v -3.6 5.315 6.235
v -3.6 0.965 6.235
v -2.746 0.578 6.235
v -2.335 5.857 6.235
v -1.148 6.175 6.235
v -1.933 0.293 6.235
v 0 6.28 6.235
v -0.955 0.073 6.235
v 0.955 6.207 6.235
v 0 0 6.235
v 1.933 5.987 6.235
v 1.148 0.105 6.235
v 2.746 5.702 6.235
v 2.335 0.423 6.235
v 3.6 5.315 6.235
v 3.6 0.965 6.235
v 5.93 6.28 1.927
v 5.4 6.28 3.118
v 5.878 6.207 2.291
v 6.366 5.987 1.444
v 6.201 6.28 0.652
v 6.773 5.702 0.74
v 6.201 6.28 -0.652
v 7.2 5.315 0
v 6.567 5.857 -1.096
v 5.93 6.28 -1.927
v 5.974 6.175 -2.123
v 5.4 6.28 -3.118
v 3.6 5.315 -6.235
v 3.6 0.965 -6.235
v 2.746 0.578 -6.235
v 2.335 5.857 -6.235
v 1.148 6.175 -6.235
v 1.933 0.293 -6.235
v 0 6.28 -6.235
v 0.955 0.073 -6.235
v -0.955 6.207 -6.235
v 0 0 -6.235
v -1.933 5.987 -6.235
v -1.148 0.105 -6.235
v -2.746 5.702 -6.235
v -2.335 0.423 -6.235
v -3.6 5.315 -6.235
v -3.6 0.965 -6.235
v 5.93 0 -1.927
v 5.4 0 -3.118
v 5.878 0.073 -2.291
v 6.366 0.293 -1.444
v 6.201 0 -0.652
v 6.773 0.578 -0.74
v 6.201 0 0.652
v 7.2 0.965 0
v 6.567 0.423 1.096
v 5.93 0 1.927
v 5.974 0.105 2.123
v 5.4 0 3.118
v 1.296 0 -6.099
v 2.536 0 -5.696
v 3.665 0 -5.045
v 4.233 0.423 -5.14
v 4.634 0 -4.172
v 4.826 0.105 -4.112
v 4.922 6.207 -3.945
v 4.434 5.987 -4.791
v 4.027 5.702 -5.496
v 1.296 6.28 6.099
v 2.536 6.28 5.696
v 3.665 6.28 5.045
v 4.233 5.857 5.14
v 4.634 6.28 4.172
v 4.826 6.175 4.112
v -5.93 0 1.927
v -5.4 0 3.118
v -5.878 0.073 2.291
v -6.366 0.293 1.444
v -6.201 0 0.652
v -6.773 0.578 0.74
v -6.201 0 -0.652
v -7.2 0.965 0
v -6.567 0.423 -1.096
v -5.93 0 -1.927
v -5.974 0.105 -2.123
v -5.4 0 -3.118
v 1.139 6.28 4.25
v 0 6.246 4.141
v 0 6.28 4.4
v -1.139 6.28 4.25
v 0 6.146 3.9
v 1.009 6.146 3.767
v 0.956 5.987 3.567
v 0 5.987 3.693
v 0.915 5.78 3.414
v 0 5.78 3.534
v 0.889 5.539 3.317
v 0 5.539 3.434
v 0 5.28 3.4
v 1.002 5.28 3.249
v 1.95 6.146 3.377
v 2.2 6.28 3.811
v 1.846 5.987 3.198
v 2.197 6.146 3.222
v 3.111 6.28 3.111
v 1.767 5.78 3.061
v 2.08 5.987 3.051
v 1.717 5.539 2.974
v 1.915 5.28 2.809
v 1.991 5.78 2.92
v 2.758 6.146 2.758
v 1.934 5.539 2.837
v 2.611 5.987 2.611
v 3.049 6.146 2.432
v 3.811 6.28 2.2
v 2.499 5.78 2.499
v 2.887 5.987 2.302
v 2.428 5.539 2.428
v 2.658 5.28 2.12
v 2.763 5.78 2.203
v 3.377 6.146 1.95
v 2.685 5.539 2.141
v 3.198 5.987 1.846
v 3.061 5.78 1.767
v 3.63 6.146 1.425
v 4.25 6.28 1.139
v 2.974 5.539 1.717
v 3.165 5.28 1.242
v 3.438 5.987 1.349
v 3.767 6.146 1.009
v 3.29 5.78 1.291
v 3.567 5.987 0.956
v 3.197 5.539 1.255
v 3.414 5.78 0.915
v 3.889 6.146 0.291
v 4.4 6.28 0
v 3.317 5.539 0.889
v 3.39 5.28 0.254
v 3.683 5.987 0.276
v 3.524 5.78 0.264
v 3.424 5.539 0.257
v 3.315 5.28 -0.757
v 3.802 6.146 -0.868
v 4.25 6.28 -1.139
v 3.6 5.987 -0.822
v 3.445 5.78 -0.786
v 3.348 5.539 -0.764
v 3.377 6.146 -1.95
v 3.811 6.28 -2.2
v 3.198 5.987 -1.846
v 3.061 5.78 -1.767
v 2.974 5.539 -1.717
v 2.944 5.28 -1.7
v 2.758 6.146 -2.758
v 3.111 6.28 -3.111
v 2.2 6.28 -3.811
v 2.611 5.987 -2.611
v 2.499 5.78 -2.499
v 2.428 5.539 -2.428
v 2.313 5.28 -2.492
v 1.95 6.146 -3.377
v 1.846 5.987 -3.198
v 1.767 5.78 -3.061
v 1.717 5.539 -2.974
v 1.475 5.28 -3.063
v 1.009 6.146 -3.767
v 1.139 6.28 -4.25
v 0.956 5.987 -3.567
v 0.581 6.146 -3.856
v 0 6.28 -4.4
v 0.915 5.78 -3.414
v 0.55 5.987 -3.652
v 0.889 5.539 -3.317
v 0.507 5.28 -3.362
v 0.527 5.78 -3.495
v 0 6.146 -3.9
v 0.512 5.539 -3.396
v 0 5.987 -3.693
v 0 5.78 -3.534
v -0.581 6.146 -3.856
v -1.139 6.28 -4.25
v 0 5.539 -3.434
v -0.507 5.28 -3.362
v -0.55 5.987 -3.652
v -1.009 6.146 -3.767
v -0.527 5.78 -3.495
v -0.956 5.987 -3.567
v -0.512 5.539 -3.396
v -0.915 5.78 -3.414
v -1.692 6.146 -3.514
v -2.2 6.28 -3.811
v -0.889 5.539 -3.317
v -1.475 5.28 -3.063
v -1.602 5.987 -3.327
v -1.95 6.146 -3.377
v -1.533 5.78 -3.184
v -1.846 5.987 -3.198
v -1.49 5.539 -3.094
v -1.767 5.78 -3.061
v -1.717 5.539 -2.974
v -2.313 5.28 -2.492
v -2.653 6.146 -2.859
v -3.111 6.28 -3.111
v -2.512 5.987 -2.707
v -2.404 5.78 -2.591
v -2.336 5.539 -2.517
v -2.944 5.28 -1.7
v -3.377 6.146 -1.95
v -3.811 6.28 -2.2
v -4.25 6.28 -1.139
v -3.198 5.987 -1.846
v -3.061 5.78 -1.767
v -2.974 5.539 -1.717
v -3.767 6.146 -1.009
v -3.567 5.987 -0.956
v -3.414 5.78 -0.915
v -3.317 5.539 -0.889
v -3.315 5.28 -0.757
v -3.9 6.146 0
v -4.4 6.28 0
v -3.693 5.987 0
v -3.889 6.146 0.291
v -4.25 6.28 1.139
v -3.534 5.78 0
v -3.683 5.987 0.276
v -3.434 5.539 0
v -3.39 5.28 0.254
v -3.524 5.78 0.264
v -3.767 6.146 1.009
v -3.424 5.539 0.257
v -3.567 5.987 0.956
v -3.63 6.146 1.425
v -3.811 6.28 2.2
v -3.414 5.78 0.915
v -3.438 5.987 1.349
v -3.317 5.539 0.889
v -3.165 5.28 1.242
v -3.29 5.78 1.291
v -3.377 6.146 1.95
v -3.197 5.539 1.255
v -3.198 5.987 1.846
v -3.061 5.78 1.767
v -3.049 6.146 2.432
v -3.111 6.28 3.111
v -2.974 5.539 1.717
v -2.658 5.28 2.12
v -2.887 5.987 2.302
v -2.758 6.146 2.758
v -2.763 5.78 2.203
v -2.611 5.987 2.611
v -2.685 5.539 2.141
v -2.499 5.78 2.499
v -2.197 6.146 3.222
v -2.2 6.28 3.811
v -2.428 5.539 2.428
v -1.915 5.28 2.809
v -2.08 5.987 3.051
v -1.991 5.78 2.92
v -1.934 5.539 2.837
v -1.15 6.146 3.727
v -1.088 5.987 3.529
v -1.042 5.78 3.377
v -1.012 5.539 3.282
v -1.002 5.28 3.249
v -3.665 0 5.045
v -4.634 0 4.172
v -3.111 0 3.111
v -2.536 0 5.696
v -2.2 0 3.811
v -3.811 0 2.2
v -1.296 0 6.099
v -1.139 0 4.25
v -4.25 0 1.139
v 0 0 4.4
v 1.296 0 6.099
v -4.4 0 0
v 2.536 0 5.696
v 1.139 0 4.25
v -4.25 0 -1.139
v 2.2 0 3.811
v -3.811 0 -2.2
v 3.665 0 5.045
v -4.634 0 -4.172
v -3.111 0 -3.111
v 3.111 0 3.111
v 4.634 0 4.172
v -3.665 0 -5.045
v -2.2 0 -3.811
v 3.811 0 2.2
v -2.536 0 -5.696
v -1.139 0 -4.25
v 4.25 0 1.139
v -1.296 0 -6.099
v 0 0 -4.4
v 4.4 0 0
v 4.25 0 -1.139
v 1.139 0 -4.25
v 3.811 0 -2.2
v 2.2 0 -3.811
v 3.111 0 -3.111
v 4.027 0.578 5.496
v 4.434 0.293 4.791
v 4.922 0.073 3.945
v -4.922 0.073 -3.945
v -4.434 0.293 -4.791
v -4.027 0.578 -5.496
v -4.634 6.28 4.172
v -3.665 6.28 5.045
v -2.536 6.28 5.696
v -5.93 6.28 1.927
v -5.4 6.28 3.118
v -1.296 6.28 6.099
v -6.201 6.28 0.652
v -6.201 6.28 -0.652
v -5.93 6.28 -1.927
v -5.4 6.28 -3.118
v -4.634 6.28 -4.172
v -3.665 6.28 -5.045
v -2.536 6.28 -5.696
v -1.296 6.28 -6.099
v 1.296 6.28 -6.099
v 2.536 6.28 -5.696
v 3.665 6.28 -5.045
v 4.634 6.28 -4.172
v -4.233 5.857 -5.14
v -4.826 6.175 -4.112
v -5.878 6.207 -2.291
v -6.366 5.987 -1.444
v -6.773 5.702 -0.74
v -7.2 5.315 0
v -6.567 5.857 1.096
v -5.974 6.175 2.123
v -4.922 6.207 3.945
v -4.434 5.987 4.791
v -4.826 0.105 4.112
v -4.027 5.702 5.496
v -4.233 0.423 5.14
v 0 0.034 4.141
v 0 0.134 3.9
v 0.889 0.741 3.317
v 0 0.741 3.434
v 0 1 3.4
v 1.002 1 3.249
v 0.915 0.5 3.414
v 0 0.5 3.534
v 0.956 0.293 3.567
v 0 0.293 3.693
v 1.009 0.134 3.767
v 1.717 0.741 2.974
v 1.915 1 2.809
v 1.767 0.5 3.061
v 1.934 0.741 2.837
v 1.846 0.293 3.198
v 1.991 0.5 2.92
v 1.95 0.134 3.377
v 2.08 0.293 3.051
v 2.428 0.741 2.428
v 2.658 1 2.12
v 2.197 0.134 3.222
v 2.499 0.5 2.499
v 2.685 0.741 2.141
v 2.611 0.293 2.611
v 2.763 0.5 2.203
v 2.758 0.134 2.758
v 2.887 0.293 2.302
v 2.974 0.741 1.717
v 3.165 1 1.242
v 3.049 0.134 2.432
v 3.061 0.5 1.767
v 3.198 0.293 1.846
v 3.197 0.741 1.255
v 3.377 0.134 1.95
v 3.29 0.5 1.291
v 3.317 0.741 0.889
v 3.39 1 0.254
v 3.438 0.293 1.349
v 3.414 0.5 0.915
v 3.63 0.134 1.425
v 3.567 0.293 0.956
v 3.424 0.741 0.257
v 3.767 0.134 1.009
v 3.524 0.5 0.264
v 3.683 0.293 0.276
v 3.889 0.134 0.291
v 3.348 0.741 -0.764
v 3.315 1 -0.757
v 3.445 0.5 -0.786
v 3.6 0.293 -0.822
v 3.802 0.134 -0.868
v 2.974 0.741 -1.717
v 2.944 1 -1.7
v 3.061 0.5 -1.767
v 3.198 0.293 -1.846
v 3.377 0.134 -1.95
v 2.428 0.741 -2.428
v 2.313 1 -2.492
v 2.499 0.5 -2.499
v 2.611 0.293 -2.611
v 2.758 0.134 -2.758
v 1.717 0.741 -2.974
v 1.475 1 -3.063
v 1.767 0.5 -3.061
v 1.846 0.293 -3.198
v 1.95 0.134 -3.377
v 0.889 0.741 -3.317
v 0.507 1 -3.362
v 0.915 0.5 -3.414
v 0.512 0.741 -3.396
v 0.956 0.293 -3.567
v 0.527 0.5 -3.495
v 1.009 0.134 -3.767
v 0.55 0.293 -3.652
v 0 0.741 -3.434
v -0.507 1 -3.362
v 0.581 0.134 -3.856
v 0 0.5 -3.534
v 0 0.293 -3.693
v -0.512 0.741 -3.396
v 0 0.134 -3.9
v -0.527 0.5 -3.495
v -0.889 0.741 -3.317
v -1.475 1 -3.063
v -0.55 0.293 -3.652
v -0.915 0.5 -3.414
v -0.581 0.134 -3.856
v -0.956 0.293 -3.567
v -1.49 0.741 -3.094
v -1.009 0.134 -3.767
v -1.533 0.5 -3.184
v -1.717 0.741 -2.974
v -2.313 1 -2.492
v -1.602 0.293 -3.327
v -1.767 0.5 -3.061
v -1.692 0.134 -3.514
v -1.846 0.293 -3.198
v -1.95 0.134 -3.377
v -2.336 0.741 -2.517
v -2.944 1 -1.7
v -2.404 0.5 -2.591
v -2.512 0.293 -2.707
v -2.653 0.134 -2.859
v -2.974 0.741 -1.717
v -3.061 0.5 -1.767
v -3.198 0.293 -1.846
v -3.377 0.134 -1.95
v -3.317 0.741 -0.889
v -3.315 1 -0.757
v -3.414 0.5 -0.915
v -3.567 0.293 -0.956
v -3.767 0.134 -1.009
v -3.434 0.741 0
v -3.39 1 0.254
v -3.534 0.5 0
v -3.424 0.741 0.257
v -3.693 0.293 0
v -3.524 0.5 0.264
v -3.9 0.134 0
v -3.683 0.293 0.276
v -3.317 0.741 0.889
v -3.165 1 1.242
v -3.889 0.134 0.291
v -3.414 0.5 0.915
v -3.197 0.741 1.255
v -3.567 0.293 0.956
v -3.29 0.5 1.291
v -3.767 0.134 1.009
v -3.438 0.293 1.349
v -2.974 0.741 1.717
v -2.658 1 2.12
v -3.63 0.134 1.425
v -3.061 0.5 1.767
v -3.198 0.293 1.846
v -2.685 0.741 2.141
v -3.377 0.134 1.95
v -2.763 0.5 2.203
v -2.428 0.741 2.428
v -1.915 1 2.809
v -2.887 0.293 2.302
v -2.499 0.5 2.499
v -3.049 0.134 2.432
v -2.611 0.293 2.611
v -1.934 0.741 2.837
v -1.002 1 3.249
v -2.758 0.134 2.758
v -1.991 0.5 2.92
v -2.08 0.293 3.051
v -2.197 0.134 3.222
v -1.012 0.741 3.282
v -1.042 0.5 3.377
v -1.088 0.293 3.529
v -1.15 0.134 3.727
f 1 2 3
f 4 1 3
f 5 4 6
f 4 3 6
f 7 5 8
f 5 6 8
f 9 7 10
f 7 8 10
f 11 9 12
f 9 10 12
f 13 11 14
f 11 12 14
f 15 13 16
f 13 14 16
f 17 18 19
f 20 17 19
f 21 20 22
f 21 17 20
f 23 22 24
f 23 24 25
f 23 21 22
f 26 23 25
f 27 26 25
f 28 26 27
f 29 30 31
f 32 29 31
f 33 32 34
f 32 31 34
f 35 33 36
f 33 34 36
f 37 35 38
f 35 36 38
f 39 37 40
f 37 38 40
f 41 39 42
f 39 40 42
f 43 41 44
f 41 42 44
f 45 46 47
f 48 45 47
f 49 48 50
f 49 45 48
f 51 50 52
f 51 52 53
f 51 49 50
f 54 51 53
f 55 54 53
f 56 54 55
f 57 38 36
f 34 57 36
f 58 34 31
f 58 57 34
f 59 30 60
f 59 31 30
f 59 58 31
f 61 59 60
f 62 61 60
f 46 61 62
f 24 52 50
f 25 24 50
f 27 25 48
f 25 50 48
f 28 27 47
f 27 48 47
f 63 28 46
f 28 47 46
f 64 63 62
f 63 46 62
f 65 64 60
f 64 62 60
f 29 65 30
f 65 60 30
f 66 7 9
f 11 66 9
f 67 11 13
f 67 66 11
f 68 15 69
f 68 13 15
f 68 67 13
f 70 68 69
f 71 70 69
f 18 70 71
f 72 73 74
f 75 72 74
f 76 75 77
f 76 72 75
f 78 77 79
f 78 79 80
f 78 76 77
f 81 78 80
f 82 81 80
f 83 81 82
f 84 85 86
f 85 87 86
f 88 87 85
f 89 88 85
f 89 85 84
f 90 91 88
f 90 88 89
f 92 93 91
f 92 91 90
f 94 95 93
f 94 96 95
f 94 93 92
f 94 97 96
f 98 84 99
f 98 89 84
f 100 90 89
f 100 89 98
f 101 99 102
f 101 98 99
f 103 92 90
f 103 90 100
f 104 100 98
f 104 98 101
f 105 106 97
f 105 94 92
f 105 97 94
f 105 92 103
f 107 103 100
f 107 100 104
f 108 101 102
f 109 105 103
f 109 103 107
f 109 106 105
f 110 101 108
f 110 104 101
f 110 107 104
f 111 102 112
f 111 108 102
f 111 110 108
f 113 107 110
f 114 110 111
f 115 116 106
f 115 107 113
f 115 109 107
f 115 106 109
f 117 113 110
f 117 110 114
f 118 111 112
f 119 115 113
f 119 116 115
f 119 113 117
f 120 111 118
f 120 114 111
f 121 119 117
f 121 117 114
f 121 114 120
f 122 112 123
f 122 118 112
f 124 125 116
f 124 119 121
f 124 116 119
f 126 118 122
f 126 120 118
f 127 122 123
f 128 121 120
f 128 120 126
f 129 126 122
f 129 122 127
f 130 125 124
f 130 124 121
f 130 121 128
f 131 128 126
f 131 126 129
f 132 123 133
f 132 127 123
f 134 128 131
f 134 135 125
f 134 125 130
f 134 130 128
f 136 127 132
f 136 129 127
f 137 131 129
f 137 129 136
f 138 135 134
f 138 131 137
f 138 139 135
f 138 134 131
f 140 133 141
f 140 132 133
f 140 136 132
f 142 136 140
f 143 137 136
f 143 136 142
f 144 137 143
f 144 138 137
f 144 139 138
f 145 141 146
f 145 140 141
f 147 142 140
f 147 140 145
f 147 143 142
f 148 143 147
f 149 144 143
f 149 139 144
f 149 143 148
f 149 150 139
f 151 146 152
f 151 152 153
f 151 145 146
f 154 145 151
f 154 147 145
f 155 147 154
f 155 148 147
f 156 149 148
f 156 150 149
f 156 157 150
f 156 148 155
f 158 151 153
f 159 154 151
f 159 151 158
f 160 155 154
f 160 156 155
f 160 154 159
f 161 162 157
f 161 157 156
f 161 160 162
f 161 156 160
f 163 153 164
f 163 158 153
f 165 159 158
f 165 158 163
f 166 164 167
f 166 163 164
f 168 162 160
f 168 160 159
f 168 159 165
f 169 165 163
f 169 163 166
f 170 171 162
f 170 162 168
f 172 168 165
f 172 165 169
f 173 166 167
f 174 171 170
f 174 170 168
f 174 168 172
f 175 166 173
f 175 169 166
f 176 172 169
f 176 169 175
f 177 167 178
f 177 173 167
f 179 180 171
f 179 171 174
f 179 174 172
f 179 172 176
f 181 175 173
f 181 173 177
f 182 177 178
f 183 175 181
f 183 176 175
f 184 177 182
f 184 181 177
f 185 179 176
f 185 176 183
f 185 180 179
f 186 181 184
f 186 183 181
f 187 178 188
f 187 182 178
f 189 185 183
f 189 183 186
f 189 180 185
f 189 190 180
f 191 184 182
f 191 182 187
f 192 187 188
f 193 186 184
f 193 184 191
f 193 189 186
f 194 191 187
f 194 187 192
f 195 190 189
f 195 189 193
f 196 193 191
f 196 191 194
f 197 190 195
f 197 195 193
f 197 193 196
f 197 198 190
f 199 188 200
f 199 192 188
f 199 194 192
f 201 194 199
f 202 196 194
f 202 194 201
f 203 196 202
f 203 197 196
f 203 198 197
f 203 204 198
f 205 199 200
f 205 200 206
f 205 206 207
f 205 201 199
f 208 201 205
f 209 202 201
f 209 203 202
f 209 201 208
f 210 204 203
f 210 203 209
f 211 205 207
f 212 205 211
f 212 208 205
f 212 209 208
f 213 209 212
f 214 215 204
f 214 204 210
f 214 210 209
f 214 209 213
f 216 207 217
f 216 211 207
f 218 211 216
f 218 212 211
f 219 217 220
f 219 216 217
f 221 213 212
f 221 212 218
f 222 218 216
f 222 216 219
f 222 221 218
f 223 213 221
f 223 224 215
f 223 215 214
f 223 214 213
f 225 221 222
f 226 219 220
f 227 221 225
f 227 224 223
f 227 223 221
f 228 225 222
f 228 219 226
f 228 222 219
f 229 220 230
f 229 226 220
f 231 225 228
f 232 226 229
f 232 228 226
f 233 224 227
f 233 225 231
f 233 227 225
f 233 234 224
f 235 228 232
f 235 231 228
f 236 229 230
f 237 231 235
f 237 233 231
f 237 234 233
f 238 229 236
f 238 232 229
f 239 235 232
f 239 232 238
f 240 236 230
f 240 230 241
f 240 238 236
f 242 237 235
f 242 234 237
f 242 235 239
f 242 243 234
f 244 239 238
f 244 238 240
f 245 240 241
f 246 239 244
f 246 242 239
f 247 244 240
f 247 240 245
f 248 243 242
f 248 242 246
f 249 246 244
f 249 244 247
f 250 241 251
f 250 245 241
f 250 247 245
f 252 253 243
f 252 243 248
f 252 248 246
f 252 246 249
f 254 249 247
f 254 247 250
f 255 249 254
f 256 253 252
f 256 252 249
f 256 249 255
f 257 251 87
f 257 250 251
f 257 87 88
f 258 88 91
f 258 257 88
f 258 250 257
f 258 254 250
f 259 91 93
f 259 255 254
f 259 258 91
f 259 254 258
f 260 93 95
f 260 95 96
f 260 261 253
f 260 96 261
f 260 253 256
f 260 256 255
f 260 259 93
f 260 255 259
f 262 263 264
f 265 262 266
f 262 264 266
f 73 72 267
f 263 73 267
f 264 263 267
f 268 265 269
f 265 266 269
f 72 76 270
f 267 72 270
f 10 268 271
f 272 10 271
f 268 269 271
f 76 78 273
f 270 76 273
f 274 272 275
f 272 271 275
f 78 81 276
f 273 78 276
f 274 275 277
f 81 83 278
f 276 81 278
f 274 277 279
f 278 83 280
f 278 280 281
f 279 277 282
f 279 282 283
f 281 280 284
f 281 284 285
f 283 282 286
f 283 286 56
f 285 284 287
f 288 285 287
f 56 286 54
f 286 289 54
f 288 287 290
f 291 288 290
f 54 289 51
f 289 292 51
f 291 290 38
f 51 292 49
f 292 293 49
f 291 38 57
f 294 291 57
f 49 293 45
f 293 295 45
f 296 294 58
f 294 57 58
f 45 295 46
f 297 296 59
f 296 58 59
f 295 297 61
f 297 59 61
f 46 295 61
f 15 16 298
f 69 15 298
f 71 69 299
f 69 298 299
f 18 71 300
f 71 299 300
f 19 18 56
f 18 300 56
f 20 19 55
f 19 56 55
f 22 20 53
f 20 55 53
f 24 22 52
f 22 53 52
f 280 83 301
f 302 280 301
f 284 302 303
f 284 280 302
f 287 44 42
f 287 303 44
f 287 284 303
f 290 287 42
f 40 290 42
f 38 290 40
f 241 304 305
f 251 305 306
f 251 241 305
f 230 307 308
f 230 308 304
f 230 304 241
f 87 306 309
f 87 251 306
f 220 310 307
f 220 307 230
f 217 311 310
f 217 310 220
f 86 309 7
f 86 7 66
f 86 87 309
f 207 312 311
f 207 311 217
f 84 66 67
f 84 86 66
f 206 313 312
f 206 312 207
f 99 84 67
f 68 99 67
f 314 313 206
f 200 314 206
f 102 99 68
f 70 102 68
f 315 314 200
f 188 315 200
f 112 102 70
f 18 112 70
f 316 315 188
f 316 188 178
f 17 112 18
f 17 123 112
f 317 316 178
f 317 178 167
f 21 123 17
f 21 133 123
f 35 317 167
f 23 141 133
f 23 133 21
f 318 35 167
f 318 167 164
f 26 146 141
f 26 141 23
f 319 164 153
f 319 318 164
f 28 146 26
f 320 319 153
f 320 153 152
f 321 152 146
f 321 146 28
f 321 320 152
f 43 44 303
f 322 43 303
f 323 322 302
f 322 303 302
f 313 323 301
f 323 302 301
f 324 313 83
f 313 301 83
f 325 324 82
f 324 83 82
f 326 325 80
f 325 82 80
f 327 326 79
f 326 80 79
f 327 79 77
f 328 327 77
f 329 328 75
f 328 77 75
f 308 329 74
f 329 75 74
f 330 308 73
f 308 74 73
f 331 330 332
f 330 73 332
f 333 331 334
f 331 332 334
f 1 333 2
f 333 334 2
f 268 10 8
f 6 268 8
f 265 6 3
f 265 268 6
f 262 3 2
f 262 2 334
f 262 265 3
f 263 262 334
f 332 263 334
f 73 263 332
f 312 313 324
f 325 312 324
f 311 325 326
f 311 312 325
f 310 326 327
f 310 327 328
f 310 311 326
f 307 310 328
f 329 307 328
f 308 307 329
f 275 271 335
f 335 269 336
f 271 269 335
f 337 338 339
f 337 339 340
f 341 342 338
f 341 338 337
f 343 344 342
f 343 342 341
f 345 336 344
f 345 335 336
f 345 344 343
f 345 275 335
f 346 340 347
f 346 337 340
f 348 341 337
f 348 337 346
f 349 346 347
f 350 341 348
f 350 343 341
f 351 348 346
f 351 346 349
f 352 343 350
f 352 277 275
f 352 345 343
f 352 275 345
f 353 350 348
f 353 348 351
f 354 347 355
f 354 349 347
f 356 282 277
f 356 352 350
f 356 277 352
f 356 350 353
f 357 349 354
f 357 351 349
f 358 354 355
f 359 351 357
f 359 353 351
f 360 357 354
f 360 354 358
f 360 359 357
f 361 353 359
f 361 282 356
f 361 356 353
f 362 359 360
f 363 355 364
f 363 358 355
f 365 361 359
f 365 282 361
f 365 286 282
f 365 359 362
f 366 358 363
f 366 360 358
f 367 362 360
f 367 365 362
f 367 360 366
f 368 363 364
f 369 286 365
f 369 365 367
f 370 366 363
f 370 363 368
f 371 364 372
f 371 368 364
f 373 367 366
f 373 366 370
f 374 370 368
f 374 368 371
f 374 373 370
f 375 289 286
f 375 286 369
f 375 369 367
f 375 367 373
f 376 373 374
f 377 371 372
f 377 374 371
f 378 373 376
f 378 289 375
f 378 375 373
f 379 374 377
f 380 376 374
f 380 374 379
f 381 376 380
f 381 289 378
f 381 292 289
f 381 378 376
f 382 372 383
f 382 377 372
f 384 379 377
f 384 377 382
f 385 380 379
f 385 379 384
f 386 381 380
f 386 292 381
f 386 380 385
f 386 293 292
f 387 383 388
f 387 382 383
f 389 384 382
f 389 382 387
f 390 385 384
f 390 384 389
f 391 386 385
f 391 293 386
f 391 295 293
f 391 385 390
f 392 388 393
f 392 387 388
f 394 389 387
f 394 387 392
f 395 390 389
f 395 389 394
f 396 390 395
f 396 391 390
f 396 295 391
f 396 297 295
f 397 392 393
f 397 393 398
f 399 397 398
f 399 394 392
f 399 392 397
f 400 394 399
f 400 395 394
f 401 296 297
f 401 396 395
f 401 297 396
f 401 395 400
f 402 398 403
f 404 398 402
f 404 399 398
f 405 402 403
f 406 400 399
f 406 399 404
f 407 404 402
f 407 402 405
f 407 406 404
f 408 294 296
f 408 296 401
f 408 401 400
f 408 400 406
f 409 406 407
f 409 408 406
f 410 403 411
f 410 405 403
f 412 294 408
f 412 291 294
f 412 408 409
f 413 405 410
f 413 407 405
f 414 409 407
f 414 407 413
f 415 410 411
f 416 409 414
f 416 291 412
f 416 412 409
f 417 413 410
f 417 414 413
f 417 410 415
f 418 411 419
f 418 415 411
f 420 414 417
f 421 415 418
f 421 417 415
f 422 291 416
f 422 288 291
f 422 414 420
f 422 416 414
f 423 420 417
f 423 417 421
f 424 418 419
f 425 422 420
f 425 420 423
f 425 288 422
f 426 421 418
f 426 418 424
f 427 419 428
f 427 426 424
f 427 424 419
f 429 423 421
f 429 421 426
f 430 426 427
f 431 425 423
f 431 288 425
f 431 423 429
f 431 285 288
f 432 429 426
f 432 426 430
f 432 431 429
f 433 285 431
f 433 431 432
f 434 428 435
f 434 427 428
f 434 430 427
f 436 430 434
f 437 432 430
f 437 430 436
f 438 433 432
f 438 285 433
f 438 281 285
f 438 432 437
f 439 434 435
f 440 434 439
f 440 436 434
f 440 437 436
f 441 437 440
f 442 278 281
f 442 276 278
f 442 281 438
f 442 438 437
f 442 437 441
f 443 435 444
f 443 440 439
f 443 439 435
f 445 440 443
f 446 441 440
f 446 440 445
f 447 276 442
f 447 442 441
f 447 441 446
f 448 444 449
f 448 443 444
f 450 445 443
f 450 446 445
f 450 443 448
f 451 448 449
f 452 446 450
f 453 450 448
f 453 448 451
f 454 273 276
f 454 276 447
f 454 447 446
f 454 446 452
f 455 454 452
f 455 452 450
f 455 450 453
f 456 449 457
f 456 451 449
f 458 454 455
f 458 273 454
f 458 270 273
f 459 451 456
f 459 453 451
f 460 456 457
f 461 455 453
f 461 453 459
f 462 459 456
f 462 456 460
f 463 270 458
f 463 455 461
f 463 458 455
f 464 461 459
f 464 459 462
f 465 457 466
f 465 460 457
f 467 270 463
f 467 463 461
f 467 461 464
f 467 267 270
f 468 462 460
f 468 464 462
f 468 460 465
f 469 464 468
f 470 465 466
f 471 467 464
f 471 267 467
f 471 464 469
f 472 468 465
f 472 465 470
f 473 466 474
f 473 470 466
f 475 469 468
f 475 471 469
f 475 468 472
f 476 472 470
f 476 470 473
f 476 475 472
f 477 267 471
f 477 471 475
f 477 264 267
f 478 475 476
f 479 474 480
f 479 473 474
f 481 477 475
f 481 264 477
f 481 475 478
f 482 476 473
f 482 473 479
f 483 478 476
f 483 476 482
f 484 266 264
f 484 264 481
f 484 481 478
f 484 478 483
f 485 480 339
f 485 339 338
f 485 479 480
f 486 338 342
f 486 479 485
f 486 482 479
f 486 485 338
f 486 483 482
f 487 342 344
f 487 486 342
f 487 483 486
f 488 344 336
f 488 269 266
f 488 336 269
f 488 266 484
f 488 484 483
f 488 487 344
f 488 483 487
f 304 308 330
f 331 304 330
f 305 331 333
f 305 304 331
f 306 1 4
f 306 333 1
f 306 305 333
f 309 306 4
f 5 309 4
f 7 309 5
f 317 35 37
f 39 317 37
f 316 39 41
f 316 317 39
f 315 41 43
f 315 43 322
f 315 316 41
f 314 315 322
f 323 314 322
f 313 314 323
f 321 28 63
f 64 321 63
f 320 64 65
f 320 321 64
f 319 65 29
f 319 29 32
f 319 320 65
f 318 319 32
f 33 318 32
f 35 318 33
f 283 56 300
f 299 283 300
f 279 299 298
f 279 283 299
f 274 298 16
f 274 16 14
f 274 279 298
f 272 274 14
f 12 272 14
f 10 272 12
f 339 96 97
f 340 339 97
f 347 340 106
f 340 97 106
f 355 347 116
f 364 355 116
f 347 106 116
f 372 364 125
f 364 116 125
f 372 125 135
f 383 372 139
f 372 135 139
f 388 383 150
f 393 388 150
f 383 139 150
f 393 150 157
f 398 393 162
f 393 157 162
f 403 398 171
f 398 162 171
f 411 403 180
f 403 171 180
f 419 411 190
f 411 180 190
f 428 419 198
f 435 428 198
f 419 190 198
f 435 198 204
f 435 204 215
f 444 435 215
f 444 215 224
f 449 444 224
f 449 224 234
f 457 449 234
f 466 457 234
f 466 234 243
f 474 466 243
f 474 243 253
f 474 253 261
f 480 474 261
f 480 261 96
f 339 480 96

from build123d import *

# Parameters (mm, degrees)
EXTRUDE_1_DEPTH     = 6.28
SKETCH_2_OUTSIDE_W  = 22.412
SKETCH_2_OUTSIDE_H  = 20.482
SKETCH_2_OUTSIDE_R  = 6.235382907
CUT_EXTRUDE_2_DEPTH = 1
CUT_EXTRUDE_2_DRAFT = -45
SKETCH_3_OUTSIDE_W  = 22.412
SKETCH_3_OUTSIDE_H  = 20.482
SKETCH_3_OUTSIDE_R  = 6.235382907
CUT_EXTRUDE_3_DEPTH = 1
CUT_EXTRUDE_3_DRAFT = -45
SKETCH_4_R          = 3.4
CUT_EXTRUDE_4_DEPTH = 7.28
FILLET_1_R          = 1
FILLET_2_R          = 1


with BuildPart() as part:
    # Эскиз1 → Бобышка-Вытянуть1 (new body)
    with BuildSketch(Plane(origin=(0, 0, 0), x_dir=(1, 0, 0), z_dir=(0, 1, 0))):
        Polygon((7.2, 0), (3.6, 6.235382907), (-3.6, 6.235382907), (-7.2, 0), (-3.6, -6.235382907), (3.6, -6.235382907), align=None)
    extrude(amount=EXTRUDE_1_DEPTH)


with BuildPart() as cut_extrude_2_tool:
    # Эскиз2 outside → Вырез-Вытянуть2 (with draft: the straight prism first)
    with BuildSketch(Plane(origin=(0, 6.28, 0), x_dir=(1, 0, 0), z_dir=(0, 1, 0))):
        Rectangle(SKETCH_2_OUTSIDE_W, SKETCH_2_OUTSIDE_H)
        Circle(SKETCH_2_OUTSIDE_R, mode=Mode.SUBTRACT)
    extrude(amount=-CUT_EXTRUDE_2_DEPTH)
    # Вырез-Вытянуть2: the draft: its side faces are tilted about the plane it starts from
    cut_extrude_2_sides = [cut_extrude_2_tool.faces().sort_by_distance(p)[0] for p in [
        (0, 5.78, 10.241),
        (11.206, 5.78, 0),
        (0, 5.78, -10.241),
        (-11.206, 5.78, 0),
        (-6.235382907, 5.78, 0),
    ]]
    draft(cut_extrude_2_sides, Plane(origin=(0, 6.28, 0), x_dir=(1, 0, 0), z_dir=(0, 1, 0)), CUT_EXTRUDE_2_DRAFT)


with BuildPart() as part_1:
    add(part.part)

    # Вырез-Вытянуть2: cut by cut_extrude_2_tool
    add(cut_extrude_2_tool.part, mode=Mode.SUBTRACT)


with BuildPart() as cut_extrude_3_tool:
    # Эскиз3 outside → Вырез-Вытянуть3 (with draft: the straight prism first)
    with BuildSketch(Plane.XZ):
        Rectangle(SKETCH_3_OUTSIDE_W, SKETCH_3_OUTSIDE_H)
        Circle(SKETCH_3_OUTSIDE_R, mode=Mode.SUBTRACT)
    extrude(amount=-CUT_EXTRUDE_3_DEPTH)
    # Вырез-Вытянуть3: the draft: its side faces are tilted about the plane it starts from
    cut_extrude_3_sides = [cut_extrude_3_tool.faces().sort_by_distance(p)[0] for p in [
        (0, 0.5, -10.241),
        (11.206, 0.5, 0),
        (0, 0.5, 10.241),
        (-11.206, 0.5, 0),
        (-6.235382907, 0.5, 0),
    ]]
    draft(cut_extrude_3_sides, Plane.XZ, CUT_EXTRUDE_3_DRAFT)


with BuildPart() as part_2:
    add(part_1.part)

    # Вырез-Вытянуть3: cut by cut_extrude_3_tool
    add(cut_extrude_3_tool.part, mode=Mode.SUBTRACT)

    # Эскиз4 → Вырез-Вытянуть4 (cut, through all)
    with BuildSketch(Plane(origin=(0, 6.28, 0), x_dir=(1, 0, 0), z_dir=(0, 1, 0))):
        with Locations(Location((0, 0, 0), (0, 0, 270))):  # turned: the seam where the file's is
            Circle(SKETCH_4_R)
    extrude(amount=-CUT_EXTRUDE_4_DEPTH, mode=Mode.SUBTRACT)

    # Скругление1
    fillet_1_edges = [part_2.edges().sort_by_distance(p)[0] for p in [
        (0, 6.28, -3.4),
    ]]
    fillet(fillet_1_edges, radius=FILLET_1_R)

    # Скругление2
    fillet_2_edges = [part_2.edges().sort_by_distance(p)[0] for p in [
        (0, 0, -3.4),
    ]]
    fillet(fillet_2_edges, radius=FILLET_2_R)


solid = part_2.part
